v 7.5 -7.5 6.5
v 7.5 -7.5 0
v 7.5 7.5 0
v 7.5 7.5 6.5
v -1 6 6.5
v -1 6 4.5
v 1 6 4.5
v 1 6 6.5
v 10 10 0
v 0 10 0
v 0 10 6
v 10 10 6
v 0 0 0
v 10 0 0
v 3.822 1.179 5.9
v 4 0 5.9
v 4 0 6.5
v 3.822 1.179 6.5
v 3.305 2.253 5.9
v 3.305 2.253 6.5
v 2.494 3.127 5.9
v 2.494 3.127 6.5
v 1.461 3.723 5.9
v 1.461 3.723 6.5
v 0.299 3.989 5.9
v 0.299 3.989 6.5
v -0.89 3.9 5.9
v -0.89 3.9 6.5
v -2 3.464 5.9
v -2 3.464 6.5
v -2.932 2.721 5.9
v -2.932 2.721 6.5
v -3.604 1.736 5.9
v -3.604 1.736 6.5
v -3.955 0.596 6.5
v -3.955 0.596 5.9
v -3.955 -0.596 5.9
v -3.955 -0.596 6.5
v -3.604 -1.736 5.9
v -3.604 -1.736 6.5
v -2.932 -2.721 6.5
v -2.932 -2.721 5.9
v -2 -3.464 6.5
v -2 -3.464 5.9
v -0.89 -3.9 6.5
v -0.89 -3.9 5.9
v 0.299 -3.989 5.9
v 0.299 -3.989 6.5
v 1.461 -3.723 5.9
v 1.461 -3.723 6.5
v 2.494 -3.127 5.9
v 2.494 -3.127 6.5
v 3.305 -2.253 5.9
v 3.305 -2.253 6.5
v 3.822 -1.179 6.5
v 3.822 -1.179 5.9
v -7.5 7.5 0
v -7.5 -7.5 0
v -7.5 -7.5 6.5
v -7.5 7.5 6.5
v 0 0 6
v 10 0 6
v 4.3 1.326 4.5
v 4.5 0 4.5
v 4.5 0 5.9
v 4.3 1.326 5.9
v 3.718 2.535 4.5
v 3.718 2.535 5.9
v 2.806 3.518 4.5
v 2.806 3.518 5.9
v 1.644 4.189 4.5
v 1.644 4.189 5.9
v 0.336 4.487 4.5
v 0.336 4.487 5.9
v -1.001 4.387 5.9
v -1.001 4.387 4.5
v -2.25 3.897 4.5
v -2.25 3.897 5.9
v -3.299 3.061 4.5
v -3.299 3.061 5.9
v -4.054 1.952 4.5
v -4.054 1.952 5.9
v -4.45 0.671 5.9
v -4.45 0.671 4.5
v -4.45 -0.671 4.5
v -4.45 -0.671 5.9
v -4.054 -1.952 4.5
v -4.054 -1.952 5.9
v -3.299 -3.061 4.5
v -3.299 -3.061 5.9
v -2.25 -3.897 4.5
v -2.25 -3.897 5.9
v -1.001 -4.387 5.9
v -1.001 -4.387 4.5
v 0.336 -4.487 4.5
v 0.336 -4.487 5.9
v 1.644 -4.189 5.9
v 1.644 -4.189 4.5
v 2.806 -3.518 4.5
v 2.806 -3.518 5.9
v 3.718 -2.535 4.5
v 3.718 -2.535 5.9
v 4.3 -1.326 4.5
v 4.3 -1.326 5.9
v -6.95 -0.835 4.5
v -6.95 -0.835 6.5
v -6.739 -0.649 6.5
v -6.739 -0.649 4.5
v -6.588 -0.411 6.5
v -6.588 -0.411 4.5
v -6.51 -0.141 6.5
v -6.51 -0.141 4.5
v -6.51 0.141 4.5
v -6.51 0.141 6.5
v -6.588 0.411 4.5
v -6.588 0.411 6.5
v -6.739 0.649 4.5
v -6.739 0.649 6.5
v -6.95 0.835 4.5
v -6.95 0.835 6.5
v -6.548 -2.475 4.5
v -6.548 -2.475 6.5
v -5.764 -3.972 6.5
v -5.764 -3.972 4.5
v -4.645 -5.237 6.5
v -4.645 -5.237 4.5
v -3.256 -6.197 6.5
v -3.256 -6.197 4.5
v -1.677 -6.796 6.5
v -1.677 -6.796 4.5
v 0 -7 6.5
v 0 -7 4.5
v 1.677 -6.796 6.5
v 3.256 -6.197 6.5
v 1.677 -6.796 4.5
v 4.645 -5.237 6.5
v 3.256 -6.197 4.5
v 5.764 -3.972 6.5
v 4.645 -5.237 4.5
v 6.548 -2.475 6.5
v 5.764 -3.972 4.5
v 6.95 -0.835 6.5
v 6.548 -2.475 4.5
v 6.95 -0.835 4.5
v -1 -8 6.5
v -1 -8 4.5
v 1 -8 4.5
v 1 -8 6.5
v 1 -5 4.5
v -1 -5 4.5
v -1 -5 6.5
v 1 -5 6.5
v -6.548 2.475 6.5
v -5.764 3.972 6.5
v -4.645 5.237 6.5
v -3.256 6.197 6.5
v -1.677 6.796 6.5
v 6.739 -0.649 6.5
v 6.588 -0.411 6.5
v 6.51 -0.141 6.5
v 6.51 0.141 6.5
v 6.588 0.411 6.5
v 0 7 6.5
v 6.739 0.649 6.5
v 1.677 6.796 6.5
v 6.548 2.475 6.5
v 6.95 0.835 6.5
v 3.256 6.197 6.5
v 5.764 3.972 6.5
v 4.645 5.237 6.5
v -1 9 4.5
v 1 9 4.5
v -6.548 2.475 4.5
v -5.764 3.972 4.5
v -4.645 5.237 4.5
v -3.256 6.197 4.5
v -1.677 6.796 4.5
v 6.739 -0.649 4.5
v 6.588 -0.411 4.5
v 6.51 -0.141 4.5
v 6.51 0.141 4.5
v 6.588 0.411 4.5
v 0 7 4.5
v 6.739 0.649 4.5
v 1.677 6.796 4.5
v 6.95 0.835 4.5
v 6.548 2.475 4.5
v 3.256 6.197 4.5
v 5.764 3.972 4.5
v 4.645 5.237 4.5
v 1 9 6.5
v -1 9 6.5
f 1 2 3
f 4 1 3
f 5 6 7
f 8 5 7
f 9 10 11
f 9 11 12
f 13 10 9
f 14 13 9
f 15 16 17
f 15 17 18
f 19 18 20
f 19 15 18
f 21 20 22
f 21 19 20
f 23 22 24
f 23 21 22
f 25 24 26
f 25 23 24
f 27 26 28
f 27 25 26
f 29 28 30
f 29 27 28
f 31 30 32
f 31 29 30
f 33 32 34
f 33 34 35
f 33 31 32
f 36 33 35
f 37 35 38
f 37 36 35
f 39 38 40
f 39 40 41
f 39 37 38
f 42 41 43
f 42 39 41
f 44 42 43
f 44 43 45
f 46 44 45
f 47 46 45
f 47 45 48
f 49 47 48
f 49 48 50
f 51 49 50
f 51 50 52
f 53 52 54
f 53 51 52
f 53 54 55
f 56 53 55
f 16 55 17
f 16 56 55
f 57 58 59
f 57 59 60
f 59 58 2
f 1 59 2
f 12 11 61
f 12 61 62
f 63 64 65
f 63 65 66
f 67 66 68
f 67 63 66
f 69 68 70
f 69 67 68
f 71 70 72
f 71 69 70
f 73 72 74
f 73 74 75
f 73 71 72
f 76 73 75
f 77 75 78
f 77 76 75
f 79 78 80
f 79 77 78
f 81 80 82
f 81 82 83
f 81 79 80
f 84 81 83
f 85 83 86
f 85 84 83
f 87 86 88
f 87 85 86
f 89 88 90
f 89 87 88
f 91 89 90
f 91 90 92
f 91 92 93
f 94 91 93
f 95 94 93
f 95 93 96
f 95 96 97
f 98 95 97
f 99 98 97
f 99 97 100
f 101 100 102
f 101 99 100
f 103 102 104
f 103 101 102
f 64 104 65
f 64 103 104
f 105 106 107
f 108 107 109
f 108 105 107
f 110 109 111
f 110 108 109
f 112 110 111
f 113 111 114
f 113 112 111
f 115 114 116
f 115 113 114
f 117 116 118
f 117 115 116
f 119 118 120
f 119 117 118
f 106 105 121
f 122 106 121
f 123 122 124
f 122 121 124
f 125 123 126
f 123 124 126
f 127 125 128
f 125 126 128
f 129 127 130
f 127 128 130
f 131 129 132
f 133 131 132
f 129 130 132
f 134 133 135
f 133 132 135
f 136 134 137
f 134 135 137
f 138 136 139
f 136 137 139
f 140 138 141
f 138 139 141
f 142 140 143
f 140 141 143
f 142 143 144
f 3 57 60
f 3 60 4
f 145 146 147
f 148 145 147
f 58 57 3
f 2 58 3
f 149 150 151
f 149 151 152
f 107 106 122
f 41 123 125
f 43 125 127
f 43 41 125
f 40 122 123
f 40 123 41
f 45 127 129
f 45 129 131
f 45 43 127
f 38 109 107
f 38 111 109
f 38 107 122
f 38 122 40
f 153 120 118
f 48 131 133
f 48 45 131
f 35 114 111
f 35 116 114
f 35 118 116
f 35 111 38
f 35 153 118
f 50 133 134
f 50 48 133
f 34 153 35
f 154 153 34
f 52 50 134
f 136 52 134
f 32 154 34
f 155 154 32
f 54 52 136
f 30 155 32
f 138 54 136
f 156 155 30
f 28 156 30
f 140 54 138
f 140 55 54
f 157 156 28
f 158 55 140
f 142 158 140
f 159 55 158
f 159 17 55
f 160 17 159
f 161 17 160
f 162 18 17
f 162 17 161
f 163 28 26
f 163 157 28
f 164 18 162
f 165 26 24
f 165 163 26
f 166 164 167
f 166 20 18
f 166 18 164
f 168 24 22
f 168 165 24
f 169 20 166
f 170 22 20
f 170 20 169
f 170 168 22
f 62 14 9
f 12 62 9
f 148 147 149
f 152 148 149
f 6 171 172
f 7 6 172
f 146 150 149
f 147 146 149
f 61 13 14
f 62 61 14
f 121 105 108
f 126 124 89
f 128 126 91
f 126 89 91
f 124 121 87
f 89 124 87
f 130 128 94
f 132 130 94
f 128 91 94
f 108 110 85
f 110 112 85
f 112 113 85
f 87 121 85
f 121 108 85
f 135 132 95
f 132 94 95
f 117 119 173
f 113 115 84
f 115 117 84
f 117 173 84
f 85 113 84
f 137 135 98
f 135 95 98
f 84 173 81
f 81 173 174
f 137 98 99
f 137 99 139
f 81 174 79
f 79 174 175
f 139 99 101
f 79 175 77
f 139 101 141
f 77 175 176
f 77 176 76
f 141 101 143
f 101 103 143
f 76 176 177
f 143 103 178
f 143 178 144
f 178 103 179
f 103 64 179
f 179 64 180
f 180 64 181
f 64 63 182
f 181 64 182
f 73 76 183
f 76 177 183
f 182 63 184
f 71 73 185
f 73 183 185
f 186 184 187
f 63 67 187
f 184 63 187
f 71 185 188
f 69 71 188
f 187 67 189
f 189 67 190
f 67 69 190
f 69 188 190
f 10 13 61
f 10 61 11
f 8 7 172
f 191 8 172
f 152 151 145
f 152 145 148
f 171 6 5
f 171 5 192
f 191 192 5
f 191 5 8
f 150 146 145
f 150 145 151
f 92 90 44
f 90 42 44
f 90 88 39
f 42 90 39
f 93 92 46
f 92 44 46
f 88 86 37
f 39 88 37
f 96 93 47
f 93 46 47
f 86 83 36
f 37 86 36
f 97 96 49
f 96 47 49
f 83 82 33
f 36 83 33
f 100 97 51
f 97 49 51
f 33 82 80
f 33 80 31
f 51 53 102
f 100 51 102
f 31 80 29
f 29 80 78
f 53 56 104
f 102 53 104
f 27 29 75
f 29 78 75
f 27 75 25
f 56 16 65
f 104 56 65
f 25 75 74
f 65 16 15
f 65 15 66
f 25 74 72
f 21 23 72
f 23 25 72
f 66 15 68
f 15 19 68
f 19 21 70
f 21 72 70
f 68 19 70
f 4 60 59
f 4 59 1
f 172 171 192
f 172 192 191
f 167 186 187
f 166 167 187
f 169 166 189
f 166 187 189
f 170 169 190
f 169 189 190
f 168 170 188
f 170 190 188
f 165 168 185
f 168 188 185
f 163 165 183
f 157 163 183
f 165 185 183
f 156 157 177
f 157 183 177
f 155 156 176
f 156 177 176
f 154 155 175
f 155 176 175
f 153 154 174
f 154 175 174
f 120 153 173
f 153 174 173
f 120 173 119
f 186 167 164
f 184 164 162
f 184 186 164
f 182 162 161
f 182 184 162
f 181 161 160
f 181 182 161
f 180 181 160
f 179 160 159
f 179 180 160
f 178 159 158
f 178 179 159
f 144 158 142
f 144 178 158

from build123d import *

# Parameters (mm, degrees)
BOX_W             = 15
BOX_H             = 15
BOX_DEPTH         = 6.5
BOX001_W          = 2
BOX001_H          = 3
BOX001_DEPTH      = 2
BOX002_W          = 2
BOX002_H          = 3
BOX002_DEPTH      = 2
CYLINDER_R        = 4.5
CYLINDER_DEPTH    = 1.4
CYLINDER003_R     = 1
CYLINDER003_DEPTH = 10
CYLINDER004_R     = 1
CYLINDER004_DEPTH = 10
CYLINDER001_R     = 4
CYLINDER001_DEPTH = 0.6
CYLINDER002_R     = 7
CYLINDER002_DEPTH = 2
BOX003_W          = 10
BOX003_H          = 10
BOX003_DEPTH      = 6


with BuildPart() as cube:
    # Box → Box (new body)
    with BuildSketch(Plane(origin=(-7.5, -7.5, 0), x_dir=(1, 0, 0), z_dir=(0, 0, 1))):
        with Locations((7.5, 7.5)):
            Rectangle(BOX_W, BOX_H)
    extrude(amount=BOX_DEPTH)


with BuildPart() as cube001:
    # Box001 → Box001 (new body)
    with BuildSketch(Plane(origin=(-1, -8, 4.5), x_dir=(1, 0, 0), z_dir=(0, 0, 1))):
        with Locations((1, 1.5)):
            Rectangle(BOX001_W, BOX001_H)
    extrude(amount=BOX001_DEPTH)


with BuildPart() as cube002:
    # Box002 → Box002 (new body)
    with BuildSketch(Plane(origin=(-1, 6, 4.5), x_dir=(1, 0, 0), z_dir=(0, 0, 1))):
        with Locations((1, 1.5)):
            Rectangle(BOX002_W, BOX002_H)
    extrude(amount=BOX002_DEPTH)


with BuildPart() as innerhole:
    # Cylinder → Cylinder (new body)
    with BuildSketch(Plane.XY):
        Circle(CYLINDER_R)
    extrude(amount=CYLINDER_DEPTH)


with BuildPart() as cylinder002:
    # Cylinder003 → Cylinder003 (new body)
    with BuildSketch(Plane(origin=(7.5, 0, 0), x_dir=(1, 0, 0), z_dir=(0, 0, 1))):
        Circle(CYLINDER003_R)
    extrude(amount=CYLINDER003_DEPTH)


with BuildPart() as cylinder003:
    # Cylinder004 → Cylinder004 (new body)
    with BuildSketch(Plane(origin=(-7.5, 0, 0), x_dir=(1, 0, 0), z_dir=(0, 0, 1))):
        Circle(CYLINDER004_R)
    extrude(amount=CYLINDER004_DEPTH)


with BuildPart() as fusion:
    # Cylinder001 → Cylinder001 (new body)
    with BuildSketch(Plane.XY.offset(1.4)):
        Circle(CYLINDER001_R)
    extrude(amount=CYLINDER001_DEPTH)

    # Fusion: union InnerHole, Cylinder002, Cylinder003
    add(innerhole.part)
    add(cylinder002.part)
    add(cylinder003.part)


with BuildPart() as cut:
    # Cylinder002 → Cylinder002 (new body)
    with BuildSketch(Plane.XY):
        Circle(CYLINDER002_R)
    extrude(amount=CYLINDER002_DEPTH)

    # Cut: cut Fusion
    add(fusion.part, mode=Mode.SUBTRACT)


with BuildPart() as cut_1:
    # Cut placement: moved
    add(cut.part.moved(Location((0, 0, 4.5))))


with BuildPart() as cube003:
    # Box003 → Box003 (new body)
    with BuildSketch(Plane.XY):
        with Locations((5, 5)):
            Rectangle(BOX003_W, BOX003_H)
    extrude(amount=BOX003_DEPTH)


solid = Compound([cube.part, cube001.part, cube002.part, cut_1.part, cube003.part])
